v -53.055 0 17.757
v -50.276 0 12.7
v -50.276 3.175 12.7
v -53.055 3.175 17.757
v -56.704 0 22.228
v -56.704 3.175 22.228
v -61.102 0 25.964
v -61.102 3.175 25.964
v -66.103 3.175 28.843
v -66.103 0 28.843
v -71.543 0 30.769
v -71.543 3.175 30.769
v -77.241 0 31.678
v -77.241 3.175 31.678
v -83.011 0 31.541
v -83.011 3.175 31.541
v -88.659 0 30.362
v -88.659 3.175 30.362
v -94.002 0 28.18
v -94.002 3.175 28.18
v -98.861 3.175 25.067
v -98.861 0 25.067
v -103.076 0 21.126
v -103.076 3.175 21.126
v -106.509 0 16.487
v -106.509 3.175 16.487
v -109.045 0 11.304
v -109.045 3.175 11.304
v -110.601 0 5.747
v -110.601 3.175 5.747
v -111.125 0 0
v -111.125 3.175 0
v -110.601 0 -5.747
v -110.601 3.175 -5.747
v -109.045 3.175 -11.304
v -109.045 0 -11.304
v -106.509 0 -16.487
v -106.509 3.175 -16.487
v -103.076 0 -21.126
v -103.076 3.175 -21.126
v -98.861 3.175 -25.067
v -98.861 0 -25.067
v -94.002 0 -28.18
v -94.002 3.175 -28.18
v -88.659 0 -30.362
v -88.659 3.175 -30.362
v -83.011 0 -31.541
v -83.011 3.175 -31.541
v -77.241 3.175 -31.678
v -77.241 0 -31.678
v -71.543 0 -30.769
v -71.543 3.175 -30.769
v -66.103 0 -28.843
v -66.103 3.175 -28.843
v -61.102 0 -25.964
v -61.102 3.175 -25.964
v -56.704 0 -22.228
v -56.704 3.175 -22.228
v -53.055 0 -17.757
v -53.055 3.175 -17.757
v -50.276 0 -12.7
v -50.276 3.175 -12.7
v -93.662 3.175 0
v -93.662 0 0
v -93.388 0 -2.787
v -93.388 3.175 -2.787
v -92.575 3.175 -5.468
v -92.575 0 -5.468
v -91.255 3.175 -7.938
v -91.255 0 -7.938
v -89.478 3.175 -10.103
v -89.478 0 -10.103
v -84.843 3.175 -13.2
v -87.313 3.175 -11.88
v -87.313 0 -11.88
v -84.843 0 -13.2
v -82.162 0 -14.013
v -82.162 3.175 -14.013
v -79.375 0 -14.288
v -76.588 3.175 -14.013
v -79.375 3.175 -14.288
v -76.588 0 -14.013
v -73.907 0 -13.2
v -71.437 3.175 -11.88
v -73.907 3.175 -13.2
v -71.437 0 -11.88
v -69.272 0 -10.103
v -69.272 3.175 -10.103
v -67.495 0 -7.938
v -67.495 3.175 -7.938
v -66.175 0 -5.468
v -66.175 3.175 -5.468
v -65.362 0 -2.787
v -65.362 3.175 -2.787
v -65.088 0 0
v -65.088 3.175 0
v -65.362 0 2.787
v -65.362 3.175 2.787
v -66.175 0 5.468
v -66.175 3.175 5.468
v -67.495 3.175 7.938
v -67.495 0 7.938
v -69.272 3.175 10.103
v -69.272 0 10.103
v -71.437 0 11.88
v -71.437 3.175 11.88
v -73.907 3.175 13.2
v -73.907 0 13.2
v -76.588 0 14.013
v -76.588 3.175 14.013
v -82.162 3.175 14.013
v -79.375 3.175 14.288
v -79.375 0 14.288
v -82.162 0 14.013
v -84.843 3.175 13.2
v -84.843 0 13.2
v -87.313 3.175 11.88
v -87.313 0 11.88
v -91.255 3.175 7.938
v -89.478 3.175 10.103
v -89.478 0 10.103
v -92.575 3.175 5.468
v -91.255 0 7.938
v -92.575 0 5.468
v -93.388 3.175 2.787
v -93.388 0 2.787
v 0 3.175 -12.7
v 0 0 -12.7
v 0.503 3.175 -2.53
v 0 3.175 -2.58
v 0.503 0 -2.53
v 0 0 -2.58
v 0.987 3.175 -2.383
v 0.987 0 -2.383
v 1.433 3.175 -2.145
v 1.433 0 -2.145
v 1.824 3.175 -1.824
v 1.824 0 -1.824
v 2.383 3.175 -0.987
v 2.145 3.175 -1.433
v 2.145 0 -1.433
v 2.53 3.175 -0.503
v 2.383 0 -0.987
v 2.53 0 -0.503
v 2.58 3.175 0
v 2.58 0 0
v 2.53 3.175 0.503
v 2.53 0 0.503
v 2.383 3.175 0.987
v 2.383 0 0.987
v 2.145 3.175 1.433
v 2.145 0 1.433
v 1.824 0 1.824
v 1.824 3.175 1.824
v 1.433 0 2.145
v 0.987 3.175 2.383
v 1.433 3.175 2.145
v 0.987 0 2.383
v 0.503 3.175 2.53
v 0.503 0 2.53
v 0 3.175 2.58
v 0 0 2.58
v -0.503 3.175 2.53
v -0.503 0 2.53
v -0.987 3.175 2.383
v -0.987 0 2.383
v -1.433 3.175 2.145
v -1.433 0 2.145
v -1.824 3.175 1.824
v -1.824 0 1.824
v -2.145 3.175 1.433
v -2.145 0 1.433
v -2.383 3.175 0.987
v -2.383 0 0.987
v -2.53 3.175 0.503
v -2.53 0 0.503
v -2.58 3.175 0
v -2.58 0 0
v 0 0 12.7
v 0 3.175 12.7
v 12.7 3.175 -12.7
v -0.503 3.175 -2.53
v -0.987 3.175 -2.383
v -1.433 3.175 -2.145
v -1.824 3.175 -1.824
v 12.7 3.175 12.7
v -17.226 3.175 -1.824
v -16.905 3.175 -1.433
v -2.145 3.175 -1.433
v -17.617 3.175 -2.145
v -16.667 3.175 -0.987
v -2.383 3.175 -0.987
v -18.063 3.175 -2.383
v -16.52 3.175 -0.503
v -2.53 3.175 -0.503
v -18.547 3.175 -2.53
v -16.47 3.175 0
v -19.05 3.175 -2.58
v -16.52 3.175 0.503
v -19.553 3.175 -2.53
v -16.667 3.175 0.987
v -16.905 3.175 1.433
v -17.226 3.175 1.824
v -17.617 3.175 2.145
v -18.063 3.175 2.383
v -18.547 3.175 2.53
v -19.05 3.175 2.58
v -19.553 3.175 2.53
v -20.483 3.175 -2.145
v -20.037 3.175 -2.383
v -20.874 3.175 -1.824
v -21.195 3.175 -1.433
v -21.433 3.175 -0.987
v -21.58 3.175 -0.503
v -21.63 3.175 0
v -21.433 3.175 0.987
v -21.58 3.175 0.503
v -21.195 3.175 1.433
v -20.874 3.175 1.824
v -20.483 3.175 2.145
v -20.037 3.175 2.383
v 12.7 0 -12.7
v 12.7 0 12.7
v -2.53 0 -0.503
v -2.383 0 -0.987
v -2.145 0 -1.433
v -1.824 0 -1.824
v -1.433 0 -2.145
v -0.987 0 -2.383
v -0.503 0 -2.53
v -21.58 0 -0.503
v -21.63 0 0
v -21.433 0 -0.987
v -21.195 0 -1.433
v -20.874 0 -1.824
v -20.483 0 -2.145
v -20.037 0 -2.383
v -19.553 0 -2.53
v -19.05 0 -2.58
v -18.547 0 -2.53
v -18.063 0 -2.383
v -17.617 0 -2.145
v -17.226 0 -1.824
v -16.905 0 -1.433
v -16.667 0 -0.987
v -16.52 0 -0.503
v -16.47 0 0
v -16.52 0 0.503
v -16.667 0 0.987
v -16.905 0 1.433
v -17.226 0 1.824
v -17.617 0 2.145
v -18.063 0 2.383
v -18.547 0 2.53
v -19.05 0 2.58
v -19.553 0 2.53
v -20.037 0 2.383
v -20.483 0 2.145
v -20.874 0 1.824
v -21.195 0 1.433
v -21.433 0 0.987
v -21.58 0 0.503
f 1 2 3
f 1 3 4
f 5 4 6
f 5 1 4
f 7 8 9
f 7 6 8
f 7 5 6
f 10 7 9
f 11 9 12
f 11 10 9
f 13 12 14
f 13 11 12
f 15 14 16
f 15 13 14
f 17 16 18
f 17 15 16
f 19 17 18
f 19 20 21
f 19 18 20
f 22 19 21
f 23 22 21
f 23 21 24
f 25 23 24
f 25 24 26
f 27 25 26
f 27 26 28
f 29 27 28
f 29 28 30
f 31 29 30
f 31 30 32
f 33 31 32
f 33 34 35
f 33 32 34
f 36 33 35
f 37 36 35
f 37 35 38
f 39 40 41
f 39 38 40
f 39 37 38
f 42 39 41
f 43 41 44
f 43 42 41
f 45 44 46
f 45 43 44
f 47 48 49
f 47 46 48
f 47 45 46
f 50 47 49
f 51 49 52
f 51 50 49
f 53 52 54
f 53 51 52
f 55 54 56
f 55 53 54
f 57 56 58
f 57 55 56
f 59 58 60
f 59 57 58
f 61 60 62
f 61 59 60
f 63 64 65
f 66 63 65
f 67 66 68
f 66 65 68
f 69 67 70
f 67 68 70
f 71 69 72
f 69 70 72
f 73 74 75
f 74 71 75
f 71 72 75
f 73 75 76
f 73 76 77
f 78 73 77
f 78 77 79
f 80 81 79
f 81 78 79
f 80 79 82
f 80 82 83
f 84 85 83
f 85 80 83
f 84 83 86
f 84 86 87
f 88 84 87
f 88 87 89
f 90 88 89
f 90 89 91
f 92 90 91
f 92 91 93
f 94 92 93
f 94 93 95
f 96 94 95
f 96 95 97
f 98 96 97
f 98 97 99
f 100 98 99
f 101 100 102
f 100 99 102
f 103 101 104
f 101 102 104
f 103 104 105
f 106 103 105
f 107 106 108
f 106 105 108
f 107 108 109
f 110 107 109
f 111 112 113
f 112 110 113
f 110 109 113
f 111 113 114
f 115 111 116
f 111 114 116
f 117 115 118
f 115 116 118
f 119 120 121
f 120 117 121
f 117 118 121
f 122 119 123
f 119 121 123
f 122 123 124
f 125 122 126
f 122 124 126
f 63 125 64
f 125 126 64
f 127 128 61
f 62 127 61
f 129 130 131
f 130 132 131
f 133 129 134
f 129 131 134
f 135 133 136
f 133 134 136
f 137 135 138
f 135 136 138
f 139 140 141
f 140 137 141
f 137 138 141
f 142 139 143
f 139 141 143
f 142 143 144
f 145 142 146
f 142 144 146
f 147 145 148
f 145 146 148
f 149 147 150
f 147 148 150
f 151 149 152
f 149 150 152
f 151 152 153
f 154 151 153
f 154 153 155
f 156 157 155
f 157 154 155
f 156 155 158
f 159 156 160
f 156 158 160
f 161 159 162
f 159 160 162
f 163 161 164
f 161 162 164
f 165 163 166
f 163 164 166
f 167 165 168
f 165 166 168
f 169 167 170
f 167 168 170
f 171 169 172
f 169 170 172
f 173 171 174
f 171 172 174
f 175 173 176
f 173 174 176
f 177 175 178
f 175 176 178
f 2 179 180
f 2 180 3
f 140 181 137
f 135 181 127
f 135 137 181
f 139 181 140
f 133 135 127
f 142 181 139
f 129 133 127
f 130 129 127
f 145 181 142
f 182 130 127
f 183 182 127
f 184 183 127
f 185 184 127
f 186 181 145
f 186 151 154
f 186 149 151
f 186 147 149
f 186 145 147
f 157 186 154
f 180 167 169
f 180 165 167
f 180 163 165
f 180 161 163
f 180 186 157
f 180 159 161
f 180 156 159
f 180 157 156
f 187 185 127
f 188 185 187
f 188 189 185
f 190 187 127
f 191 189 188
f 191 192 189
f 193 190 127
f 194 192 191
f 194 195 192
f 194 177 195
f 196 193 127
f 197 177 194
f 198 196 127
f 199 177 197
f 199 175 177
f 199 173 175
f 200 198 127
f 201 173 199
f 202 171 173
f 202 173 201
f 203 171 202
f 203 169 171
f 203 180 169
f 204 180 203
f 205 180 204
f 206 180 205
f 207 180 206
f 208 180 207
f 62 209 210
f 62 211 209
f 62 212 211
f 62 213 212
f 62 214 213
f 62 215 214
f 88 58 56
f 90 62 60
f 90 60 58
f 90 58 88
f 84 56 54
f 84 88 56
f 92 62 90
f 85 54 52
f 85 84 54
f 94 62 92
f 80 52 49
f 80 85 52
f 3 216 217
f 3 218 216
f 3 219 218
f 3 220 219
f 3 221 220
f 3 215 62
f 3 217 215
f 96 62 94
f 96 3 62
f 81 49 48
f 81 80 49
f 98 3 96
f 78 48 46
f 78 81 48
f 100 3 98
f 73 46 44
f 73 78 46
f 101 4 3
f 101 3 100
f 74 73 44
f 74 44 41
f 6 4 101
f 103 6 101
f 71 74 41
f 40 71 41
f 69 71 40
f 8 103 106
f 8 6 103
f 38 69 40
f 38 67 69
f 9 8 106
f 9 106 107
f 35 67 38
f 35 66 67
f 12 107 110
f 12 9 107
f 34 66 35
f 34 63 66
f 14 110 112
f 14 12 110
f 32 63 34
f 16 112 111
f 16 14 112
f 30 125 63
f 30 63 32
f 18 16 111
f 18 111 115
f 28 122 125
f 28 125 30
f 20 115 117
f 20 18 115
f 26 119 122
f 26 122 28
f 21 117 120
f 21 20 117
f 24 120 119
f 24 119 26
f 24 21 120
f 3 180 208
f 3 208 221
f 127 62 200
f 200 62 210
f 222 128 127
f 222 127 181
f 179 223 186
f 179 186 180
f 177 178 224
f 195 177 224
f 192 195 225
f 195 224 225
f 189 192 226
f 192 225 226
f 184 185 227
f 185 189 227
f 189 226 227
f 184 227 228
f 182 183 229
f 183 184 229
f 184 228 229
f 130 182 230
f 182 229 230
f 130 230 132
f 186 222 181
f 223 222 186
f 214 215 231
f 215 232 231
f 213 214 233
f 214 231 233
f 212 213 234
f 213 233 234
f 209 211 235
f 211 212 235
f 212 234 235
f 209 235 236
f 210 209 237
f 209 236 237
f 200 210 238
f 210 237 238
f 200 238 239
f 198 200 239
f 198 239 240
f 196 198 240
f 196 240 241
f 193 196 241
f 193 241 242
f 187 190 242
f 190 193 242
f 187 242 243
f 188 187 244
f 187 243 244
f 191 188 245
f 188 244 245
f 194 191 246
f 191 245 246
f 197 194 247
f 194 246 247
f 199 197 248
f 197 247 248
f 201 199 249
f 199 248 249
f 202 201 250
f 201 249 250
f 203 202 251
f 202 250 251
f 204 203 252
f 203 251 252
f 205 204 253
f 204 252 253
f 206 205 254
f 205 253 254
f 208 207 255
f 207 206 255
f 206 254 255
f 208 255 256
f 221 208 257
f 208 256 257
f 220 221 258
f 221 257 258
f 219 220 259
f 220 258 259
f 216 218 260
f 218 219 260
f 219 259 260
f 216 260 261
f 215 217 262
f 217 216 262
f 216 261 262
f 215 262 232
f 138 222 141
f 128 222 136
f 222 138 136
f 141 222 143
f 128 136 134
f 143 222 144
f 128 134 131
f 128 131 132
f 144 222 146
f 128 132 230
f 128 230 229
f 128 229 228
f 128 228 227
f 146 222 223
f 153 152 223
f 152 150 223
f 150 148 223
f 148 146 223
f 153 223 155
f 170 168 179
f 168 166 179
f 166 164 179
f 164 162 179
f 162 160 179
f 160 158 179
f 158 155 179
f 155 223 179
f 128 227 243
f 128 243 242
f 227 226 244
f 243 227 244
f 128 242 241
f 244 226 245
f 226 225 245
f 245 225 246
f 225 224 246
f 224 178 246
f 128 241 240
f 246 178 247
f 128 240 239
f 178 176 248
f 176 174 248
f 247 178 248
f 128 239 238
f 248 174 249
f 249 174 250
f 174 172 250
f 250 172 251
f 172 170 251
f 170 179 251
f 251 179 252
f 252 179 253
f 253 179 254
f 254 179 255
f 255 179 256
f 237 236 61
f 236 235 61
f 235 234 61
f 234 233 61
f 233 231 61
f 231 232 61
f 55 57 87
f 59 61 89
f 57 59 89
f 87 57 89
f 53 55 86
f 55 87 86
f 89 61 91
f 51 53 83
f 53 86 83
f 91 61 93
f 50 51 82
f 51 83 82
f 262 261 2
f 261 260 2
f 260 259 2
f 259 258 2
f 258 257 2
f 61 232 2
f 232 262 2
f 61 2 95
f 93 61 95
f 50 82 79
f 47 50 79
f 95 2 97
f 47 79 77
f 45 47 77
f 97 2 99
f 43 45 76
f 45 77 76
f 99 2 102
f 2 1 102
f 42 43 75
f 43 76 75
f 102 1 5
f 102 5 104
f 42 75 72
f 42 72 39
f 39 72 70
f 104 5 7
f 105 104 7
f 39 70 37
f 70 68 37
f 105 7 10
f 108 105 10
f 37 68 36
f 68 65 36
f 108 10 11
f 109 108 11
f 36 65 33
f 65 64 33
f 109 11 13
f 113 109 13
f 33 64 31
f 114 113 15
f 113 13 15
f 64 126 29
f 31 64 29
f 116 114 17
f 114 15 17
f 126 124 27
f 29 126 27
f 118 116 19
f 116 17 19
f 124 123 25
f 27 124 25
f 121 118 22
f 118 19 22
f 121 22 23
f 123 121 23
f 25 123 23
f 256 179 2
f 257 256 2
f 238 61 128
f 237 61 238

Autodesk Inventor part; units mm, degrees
ref_plane "YZ Plane" through (0, 0, 0) normal (1, 0, 0) x (0, 1, 0)
ref_plane "XZ Plane" through (0, 0, 0) normal (0, 1, 0) x (-1, 0, 0)
ref_plane "XY Plane" through (0, 0, 0) normal (0, 0, 1) x (1, 0, 0)
sketch "Sketch1" plane through (0, 0, 0) normal (0, 1, 0) x (-1, 0, 0)
  line L0 (0, 0) -> (0, -12.7)
  line L1 (0, -12.7) -> (50.8, -12.7)
  line L2 (0, 12.7) -> (50.8, 12.7)
  line L3 (50.8, -12.7) -> (50.8, 0) construction
  line L4 (50.8, 0) -> (79.375, 0) construction
  circle A0 centre (79.375, 0) radius 14.2875
  arc A1 (50.2756, -12.7) -> (50.2756, 12.7) centre (79.375, 0) ccw
  line L5 (0, 0) -> (19.05, 0) construction
  circle A2 centre (19.05, 0) radius 2.5797
  circle A3 centre (0, 0) radius 2.5797
  line L6 (0, -12.7) -> (-12.7, -12.7)
  line L7 (-12.7, -12.7) -> (-12.7, 12.7)
  line L8 (-12.7, 12.7) -> (0, 12.7)
  line L9 (-12.7, 0) -> (0, 0) construction
  dimension "d1" = 50.8
  dimension "d2" = 28.575
  dimension "d3" = 28.575
  dimension "d4" = 63.5
  dimension "d6" = 19.05
  dimension "d7" = 5.1594
  dimension "d8" = 5.1594
  dimension "d11" = 12.7
  dimension "d14" = 12.7
extrude "Extrusion1" add sketch "Sketch1" along normal blind 3.175
properties part number "wheel tip"
